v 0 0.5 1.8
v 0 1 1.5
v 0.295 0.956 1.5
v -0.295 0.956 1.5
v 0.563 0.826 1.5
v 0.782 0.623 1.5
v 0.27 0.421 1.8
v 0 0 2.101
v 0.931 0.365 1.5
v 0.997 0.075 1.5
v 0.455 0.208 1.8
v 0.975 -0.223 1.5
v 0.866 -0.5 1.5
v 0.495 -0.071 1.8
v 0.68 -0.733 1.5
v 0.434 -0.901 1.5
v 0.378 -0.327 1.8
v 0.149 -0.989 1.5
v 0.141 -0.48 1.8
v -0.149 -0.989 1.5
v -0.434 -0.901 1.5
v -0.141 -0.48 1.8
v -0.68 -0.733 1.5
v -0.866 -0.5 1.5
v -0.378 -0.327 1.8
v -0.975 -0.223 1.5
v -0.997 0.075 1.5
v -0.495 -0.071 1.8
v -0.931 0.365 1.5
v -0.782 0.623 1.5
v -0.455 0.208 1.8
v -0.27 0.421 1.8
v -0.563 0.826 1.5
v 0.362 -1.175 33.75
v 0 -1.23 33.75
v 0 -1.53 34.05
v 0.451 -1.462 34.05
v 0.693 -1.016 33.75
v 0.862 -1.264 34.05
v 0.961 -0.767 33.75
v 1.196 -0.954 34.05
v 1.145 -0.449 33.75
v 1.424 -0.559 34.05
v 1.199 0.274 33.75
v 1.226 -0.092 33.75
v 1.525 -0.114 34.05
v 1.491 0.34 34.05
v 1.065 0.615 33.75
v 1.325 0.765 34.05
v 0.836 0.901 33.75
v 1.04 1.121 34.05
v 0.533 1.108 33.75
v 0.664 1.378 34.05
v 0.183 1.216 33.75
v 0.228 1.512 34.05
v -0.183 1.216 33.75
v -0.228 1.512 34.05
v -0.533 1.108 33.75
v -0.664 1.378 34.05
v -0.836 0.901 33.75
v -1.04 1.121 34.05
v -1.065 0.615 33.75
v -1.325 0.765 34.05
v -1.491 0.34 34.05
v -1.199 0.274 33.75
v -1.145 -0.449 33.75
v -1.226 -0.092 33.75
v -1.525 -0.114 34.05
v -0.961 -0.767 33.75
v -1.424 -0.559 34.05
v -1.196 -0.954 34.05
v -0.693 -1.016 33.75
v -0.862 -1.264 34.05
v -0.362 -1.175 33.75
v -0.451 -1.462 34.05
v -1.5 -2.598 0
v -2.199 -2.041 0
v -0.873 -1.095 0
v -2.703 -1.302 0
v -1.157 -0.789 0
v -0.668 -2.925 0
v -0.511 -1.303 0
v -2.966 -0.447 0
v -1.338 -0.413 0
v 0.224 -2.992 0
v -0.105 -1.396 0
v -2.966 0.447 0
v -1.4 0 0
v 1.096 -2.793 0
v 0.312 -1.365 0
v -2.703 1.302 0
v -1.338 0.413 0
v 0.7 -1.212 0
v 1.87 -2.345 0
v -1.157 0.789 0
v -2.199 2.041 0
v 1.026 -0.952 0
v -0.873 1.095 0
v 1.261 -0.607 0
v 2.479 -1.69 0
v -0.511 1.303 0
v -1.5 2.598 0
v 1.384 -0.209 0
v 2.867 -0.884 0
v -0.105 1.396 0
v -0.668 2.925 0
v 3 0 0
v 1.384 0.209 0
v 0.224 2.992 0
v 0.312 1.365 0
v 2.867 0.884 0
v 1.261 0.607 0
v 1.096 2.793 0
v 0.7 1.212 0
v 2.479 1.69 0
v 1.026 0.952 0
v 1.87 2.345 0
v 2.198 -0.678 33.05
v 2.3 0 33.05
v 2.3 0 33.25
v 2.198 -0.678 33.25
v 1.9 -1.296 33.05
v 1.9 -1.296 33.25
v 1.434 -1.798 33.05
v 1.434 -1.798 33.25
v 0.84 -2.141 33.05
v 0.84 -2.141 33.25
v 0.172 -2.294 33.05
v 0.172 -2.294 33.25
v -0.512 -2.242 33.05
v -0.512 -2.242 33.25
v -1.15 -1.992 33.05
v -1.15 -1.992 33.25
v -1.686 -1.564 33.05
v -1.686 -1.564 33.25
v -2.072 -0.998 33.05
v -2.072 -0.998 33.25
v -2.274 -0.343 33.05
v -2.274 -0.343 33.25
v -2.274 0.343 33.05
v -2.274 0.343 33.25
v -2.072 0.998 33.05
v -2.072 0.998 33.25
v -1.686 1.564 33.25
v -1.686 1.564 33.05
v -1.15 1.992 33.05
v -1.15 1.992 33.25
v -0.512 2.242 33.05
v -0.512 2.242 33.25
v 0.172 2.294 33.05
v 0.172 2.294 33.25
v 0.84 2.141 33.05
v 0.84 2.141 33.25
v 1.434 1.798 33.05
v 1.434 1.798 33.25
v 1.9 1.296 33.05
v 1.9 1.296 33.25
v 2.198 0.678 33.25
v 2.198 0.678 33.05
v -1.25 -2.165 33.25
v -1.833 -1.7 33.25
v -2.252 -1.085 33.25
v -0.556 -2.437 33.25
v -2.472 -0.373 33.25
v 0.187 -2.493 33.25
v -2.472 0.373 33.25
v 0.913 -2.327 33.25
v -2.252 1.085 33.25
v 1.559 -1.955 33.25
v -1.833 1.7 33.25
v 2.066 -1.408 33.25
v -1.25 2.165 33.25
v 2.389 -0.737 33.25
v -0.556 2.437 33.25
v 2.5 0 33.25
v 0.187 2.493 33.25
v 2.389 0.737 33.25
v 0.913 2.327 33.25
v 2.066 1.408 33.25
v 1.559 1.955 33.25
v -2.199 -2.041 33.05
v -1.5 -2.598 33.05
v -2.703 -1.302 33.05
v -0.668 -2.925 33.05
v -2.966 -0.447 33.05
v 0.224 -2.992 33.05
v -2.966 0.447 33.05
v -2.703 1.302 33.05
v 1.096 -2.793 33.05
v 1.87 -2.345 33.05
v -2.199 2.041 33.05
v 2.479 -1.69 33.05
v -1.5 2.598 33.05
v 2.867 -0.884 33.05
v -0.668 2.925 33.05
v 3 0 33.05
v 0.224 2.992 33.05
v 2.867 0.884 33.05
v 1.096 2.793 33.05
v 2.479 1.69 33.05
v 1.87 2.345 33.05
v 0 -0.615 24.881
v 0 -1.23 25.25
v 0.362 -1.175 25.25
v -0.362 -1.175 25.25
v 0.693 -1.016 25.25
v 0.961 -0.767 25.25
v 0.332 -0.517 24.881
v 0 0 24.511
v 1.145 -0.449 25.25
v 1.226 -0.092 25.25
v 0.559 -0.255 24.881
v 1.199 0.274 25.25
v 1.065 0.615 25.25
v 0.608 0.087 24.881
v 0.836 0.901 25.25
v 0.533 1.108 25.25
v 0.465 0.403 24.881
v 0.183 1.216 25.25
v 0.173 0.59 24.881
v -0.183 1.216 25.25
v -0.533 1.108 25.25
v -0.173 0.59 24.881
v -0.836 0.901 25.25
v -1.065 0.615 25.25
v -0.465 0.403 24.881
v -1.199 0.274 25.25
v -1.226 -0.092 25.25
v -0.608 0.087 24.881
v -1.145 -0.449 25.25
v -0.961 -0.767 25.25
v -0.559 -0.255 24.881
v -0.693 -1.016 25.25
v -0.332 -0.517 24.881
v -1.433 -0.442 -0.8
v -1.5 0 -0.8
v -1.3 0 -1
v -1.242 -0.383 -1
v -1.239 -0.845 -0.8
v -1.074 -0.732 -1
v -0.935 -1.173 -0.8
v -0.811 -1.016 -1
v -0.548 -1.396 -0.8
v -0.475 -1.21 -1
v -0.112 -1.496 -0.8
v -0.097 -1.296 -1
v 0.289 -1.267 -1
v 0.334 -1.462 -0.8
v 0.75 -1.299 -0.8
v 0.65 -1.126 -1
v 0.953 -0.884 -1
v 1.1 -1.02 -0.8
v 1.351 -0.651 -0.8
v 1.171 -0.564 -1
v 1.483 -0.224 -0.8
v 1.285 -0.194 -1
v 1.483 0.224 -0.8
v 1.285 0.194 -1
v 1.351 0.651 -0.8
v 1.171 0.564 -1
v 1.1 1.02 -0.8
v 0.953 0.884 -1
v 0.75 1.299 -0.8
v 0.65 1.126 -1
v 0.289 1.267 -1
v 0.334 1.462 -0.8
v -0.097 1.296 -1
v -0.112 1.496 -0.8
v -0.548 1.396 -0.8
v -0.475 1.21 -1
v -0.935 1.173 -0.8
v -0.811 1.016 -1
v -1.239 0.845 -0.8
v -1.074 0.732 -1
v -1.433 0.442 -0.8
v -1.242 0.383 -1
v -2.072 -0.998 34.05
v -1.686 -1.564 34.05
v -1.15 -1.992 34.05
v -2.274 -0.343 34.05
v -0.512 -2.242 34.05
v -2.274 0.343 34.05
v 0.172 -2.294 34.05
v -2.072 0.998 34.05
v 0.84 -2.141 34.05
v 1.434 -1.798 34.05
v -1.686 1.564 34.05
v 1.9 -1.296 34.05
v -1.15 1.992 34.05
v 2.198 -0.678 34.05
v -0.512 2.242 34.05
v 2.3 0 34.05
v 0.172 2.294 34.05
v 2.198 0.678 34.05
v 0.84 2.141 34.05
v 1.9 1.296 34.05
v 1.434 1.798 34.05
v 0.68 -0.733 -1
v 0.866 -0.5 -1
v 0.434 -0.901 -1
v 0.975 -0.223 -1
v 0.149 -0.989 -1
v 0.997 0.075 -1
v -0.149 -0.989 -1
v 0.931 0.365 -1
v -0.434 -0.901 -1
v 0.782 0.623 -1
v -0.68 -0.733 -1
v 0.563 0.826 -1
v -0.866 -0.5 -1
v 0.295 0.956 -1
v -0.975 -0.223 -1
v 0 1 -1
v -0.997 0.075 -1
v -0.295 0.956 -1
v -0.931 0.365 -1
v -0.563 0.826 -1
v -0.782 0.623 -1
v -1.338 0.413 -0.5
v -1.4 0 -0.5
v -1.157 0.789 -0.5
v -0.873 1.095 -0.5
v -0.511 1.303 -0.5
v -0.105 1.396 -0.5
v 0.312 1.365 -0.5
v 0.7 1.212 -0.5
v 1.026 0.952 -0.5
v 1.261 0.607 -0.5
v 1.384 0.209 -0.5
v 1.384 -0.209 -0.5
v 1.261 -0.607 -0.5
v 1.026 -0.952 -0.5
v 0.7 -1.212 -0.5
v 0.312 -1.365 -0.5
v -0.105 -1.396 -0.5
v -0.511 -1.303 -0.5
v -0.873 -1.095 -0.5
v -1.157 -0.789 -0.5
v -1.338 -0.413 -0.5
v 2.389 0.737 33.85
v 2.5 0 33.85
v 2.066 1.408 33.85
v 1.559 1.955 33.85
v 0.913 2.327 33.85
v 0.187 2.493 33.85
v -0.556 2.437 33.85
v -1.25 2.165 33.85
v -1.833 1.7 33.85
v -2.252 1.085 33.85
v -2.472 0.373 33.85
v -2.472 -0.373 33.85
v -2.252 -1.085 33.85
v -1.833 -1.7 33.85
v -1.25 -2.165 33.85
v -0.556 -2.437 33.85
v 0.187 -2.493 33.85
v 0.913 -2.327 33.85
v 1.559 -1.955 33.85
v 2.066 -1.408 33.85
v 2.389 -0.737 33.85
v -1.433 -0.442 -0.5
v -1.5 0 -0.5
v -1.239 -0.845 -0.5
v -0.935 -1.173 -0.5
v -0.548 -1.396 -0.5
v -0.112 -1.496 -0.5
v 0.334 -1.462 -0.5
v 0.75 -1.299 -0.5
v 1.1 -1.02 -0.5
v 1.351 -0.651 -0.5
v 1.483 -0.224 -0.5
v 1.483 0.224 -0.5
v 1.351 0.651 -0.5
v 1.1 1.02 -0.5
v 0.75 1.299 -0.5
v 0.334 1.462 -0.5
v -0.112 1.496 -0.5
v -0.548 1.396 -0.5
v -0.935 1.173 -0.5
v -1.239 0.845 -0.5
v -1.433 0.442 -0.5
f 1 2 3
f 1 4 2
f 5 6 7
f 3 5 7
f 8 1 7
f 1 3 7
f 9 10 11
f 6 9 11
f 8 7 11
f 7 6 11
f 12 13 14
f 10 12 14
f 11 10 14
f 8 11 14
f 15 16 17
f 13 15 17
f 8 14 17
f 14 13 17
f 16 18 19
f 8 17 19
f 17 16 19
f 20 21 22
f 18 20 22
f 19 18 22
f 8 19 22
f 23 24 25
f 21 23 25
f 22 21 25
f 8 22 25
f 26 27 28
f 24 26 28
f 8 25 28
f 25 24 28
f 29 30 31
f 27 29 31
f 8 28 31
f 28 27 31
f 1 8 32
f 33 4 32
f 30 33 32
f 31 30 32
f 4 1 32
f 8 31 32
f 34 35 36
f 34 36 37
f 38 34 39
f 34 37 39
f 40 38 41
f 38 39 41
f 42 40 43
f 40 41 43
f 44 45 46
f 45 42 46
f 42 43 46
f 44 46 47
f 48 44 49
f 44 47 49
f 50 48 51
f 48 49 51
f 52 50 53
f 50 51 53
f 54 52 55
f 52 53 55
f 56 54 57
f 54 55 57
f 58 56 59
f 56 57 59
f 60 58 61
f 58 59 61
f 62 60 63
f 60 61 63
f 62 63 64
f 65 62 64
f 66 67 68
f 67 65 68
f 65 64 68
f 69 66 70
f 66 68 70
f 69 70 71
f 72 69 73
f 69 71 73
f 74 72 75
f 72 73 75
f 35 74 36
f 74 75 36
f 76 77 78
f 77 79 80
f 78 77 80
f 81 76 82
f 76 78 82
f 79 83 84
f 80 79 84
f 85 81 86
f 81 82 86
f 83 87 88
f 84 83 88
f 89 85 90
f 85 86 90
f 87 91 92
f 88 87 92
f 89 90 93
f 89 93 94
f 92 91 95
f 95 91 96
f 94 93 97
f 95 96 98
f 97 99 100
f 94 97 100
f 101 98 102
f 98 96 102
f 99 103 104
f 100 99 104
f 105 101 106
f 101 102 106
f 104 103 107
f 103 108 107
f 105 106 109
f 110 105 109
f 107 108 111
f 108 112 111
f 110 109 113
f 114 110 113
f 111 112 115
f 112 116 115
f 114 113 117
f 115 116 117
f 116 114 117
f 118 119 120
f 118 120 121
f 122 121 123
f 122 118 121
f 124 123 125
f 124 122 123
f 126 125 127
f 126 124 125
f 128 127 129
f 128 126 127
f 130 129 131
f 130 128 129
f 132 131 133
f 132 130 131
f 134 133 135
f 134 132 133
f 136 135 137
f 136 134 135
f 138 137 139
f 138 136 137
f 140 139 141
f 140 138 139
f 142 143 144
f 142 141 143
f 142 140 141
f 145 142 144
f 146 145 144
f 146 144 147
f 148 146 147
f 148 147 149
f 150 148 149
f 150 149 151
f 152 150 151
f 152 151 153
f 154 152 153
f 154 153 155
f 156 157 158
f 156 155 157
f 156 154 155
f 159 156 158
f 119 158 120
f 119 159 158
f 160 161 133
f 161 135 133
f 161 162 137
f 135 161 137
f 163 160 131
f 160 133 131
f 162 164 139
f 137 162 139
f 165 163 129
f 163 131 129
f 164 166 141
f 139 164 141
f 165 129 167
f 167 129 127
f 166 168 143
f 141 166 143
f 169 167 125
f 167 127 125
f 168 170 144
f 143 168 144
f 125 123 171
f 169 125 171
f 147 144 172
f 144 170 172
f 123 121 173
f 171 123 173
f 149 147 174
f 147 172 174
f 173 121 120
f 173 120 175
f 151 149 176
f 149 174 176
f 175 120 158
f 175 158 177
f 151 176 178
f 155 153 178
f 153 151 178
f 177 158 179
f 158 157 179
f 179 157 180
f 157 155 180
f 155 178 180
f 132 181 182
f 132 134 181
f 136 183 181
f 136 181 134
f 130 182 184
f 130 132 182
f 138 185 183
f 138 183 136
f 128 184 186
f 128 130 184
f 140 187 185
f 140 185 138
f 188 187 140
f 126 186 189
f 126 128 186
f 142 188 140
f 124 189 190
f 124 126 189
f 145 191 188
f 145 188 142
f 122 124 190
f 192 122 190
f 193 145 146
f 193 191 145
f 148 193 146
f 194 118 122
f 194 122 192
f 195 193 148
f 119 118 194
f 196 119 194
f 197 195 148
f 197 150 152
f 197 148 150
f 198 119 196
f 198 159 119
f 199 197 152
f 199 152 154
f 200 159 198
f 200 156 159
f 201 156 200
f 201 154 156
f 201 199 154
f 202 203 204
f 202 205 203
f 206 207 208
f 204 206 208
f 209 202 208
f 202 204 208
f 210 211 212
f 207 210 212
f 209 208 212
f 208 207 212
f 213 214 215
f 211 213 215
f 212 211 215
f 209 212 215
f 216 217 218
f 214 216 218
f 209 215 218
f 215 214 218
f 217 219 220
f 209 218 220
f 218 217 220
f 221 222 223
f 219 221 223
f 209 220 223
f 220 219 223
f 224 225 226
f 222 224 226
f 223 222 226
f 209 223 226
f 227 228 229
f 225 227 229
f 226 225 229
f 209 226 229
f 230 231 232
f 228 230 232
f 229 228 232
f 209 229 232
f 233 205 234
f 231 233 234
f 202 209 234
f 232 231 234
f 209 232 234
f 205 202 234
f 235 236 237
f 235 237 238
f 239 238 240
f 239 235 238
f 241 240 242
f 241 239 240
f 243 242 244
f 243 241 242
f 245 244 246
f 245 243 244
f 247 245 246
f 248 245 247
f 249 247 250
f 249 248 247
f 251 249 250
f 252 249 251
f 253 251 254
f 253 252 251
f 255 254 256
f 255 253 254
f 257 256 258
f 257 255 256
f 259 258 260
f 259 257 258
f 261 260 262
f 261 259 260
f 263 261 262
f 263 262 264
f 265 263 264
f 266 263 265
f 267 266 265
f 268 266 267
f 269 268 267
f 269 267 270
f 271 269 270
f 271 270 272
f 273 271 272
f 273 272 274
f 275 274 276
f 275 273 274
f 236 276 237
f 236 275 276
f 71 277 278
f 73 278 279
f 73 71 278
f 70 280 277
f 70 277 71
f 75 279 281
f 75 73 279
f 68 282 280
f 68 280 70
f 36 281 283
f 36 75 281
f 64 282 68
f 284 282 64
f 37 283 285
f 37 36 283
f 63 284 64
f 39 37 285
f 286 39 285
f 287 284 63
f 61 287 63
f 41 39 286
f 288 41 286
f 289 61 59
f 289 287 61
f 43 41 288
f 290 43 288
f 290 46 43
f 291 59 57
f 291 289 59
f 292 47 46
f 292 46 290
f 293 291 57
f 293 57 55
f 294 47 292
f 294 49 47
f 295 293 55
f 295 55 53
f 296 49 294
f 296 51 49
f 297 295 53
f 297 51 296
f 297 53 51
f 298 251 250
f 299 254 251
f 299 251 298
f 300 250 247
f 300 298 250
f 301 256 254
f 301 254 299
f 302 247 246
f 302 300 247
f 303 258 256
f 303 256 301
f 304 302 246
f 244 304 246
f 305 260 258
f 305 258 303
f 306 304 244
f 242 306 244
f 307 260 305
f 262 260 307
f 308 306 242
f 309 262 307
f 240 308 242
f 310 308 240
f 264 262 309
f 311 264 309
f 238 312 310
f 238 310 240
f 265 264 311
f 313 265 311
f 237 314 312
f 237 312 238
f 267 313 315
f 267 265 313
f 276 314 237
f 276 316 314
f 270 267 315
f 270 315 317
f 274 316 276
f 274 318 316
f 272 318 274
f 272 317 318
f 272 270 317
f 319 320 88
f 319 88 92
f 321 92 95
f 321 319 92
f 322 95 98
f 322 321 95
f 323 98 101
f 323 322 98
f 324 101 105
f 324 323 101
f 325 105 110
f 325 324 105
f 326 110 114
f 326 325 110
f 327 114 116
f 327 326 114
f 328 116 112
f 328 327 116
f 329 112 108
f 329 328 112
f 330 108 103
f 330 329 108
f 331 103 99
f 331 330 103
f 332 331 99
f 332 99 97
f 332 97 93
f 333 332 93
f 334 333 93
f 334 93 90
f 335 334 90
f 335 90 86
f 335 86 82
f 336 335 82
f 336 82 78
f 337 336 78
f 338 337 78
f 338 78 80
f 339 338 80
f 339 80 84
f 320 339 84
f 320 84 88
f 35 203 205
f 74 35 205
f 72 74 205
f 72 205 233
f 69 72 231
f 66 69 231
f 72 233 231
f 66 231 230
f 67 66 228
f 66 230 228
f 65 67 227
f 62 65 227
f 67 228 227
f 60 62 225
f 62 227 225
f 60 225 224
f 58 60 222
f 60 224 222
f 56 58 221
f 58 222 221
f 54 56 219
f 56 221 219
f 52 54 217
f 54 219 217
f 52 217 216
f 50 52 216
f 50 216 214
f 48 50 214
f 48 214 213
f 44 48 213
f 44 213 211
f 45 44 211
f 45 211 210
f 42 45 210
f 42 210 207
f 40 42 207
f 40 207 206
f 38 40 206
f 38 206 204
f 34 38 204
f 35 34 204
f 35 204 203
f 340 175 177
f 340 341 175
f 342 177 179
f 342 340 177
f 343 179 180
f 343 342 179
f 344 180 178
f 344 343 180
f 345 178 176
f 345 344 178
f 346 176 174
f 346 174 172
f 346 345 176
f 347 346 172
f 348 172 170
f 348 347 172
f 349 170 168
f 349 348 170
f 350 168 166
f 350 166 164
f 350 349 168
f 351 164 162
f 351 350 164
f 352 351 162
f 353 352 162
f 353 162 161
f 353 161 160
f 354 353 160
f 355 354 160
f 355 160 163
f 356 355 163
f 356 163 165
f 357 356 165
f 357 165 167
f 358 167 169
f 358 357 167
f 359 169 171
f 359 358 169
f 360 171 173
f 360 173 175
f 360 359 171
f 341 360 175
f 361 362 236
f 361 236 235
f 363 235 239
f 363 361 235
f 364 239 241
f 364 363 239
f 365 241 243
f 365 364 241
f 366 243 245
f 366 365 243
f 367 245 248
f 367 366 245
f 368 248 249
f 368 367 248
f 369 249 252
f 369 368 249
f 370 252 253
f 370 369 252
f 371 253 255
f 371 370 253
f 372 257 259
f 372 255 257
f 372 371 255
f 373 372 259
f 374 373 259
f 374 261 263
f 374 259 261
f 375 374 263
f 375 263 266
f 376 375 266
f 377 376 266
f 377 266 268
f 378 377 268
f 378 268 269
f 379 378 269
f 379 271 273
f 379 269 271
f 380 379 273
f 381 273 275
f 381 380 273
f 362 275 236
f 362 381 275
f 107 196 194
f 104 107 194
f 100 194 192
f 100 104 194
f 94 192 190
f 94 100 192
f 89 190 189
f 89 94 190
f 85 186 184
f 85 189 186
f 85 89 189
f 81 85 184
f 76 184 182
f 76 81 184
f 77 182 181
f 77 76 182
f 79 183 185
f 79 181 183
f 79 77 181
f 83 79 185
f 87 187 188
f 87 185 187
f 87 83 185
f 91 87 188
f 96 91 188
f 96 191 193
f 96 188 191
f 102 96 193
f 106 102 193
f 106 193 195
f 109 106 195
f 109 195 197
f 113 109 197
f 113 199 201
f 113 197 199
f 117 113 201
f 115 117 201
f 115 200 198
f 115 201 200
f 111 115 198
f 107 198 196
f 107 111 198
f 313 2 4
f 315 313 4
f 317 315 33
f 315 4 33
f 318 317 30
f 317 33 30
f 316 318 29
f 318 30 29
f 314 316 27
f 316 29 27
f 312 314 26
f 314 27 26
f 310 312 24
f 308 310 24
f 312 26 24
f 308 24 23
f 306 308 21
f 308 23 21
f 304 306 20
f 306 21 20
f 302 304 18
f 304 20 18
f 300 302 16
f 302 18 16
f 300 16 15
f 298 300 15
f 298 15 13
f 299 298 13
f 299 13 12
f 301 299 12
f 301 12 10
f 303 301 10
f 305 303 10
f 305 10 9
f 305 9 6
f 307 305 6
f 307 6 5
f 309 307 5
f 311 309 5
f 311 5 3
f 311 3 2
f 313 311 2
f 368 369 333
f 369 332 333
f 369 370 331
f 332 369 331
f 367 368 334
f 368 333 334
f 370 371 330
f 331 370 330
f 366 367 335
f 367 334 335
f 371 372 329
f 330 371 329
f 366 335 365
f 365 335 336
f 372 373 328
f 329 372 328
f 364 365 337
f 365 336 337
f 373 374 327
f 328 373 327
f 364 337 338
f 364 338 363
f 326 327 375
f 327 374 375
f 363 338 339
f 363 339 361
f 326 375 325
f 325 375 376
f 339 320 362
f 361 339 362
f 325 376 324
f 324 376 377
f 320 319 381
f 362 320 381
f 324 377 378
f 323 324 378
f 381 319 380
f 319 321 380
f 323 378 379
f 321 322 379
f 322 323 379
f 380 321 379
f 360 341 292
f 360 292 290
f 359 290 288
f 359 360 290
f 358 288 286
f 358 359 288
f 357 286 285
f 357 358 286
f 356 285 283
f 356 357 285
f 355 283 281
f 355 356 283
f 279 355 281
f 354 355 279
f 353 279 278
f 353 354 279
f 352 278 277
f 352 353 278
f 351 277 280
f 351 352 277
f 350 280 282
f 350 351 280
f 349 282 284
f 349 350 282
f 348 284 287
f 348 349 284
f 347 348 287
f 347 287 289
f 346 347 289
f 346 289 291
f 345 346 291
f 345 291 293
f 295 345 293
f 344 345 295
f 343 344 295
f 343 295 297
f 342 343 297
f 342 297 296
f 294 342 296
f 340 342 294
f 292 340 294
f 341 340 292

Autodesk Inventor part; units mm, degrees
ref_plane "YZ Plane" through (0, 0, 0) normal (1, 0, 0) x (0, 1, 0)
ref_plane "XZ Plane" through (0, 0, 0) normal (0, 1, 0) x (-1, 0, 0)
ref_plane "XY Plane" through (0, 0, 0) normal (0, 0, 1) x (1, 0, 0)
sketch "Sketch1" plane through (0, 0, 0) normal (0, 0, 1) x (1, 0, 0)
  circle A0 centre (0, 0) radius 3
  dimension "d0" = 6
extrude "Extrusion1" add sketch "Sketch1" along normal blind 34.05
sketch "Sketch2" plane through (0, 0, 34.05) normal (0, 0, 1) x (1, 0, 0)
  circle A0 centre (0, 0) radius 2
  dimension "d3" = 4
hole "Hole1" at (0, 0, 34.05) direction (0, 0, -1) diameter 2.459 depth 8.8 tip angle 118 thread size "M3x0.5" class "6H" standard "ISO Metric profile"
chamfer "Chamfer1" distance 0.3 angle 45 1 edges at (0, 1.2295, 34.05)
sketch "Sketch3" plane through (0, 0, 34.05) normal (0, 0, 1) x (1, 0, 0)
  circle A0 centre (0, 0) radius 3
  circle A1 centre (0, 0) radius 2.5
  dimension "d14" = 5
extrude "Extrusion2" cut sketch "Sketch3" against normal blind 1
sketch "Sketch4" plane through (0, 0, 0) normal (0, 0, -1) x (-1, 0, 0)
  circle A0 centre (0, 0) radius 1.5
  dimension "d17" = 3
extrude "Extrusion3" add sketch "Sketch4" along normal blind 1
sketch "Sketch5" plane through (0, 0, -1) normal (0, 0, -1) x (-1, 0, 0)
  point P0 (0, 0)
  point P1 (0, 0)
hole "Hole2" at (0, 0, -1) direction (0, 0, 1) diameter 2 depth 2.5 tip angle 118
ref_plane "Work Plane2" through (0, 0, -0.5) normal (0, 0, -1) x (-1, 0, 0)
sketch "Sketch7" plane through (0, 0, -0.5) normal (0, 0, -1) x (-1, 0, 0)
  circle A0 centre (0, 0) radius 1.4
  circle A1 centre (0, 0) radius 1.5
  dimension "d29" = 2.8
  dimension "d30" = 3
extrude "Extrusion4" cut sketch "Sketch7" against normal blind 0.5
sketch "Sketch8" plane through (0, 0, 33.05) normal (0, 0, 1) x (1, 0, 0)
  circle A0 centre (0, 0) radius 2.5
  circle A1 centre (0, 0) radius 2.5 projected
  circle A2 centre (0, 0) radius 2.3
  dimension "d31" = 4.6
extrude "Extrusion5" cut sketch "Sketch8" along normal blind 0.2
chamfer "Chamfer2" distance 0.2 angle 45 2 edges at (1.5, 0, -1) (-2.5, 0, 34.05)
properties part number "słupek"
